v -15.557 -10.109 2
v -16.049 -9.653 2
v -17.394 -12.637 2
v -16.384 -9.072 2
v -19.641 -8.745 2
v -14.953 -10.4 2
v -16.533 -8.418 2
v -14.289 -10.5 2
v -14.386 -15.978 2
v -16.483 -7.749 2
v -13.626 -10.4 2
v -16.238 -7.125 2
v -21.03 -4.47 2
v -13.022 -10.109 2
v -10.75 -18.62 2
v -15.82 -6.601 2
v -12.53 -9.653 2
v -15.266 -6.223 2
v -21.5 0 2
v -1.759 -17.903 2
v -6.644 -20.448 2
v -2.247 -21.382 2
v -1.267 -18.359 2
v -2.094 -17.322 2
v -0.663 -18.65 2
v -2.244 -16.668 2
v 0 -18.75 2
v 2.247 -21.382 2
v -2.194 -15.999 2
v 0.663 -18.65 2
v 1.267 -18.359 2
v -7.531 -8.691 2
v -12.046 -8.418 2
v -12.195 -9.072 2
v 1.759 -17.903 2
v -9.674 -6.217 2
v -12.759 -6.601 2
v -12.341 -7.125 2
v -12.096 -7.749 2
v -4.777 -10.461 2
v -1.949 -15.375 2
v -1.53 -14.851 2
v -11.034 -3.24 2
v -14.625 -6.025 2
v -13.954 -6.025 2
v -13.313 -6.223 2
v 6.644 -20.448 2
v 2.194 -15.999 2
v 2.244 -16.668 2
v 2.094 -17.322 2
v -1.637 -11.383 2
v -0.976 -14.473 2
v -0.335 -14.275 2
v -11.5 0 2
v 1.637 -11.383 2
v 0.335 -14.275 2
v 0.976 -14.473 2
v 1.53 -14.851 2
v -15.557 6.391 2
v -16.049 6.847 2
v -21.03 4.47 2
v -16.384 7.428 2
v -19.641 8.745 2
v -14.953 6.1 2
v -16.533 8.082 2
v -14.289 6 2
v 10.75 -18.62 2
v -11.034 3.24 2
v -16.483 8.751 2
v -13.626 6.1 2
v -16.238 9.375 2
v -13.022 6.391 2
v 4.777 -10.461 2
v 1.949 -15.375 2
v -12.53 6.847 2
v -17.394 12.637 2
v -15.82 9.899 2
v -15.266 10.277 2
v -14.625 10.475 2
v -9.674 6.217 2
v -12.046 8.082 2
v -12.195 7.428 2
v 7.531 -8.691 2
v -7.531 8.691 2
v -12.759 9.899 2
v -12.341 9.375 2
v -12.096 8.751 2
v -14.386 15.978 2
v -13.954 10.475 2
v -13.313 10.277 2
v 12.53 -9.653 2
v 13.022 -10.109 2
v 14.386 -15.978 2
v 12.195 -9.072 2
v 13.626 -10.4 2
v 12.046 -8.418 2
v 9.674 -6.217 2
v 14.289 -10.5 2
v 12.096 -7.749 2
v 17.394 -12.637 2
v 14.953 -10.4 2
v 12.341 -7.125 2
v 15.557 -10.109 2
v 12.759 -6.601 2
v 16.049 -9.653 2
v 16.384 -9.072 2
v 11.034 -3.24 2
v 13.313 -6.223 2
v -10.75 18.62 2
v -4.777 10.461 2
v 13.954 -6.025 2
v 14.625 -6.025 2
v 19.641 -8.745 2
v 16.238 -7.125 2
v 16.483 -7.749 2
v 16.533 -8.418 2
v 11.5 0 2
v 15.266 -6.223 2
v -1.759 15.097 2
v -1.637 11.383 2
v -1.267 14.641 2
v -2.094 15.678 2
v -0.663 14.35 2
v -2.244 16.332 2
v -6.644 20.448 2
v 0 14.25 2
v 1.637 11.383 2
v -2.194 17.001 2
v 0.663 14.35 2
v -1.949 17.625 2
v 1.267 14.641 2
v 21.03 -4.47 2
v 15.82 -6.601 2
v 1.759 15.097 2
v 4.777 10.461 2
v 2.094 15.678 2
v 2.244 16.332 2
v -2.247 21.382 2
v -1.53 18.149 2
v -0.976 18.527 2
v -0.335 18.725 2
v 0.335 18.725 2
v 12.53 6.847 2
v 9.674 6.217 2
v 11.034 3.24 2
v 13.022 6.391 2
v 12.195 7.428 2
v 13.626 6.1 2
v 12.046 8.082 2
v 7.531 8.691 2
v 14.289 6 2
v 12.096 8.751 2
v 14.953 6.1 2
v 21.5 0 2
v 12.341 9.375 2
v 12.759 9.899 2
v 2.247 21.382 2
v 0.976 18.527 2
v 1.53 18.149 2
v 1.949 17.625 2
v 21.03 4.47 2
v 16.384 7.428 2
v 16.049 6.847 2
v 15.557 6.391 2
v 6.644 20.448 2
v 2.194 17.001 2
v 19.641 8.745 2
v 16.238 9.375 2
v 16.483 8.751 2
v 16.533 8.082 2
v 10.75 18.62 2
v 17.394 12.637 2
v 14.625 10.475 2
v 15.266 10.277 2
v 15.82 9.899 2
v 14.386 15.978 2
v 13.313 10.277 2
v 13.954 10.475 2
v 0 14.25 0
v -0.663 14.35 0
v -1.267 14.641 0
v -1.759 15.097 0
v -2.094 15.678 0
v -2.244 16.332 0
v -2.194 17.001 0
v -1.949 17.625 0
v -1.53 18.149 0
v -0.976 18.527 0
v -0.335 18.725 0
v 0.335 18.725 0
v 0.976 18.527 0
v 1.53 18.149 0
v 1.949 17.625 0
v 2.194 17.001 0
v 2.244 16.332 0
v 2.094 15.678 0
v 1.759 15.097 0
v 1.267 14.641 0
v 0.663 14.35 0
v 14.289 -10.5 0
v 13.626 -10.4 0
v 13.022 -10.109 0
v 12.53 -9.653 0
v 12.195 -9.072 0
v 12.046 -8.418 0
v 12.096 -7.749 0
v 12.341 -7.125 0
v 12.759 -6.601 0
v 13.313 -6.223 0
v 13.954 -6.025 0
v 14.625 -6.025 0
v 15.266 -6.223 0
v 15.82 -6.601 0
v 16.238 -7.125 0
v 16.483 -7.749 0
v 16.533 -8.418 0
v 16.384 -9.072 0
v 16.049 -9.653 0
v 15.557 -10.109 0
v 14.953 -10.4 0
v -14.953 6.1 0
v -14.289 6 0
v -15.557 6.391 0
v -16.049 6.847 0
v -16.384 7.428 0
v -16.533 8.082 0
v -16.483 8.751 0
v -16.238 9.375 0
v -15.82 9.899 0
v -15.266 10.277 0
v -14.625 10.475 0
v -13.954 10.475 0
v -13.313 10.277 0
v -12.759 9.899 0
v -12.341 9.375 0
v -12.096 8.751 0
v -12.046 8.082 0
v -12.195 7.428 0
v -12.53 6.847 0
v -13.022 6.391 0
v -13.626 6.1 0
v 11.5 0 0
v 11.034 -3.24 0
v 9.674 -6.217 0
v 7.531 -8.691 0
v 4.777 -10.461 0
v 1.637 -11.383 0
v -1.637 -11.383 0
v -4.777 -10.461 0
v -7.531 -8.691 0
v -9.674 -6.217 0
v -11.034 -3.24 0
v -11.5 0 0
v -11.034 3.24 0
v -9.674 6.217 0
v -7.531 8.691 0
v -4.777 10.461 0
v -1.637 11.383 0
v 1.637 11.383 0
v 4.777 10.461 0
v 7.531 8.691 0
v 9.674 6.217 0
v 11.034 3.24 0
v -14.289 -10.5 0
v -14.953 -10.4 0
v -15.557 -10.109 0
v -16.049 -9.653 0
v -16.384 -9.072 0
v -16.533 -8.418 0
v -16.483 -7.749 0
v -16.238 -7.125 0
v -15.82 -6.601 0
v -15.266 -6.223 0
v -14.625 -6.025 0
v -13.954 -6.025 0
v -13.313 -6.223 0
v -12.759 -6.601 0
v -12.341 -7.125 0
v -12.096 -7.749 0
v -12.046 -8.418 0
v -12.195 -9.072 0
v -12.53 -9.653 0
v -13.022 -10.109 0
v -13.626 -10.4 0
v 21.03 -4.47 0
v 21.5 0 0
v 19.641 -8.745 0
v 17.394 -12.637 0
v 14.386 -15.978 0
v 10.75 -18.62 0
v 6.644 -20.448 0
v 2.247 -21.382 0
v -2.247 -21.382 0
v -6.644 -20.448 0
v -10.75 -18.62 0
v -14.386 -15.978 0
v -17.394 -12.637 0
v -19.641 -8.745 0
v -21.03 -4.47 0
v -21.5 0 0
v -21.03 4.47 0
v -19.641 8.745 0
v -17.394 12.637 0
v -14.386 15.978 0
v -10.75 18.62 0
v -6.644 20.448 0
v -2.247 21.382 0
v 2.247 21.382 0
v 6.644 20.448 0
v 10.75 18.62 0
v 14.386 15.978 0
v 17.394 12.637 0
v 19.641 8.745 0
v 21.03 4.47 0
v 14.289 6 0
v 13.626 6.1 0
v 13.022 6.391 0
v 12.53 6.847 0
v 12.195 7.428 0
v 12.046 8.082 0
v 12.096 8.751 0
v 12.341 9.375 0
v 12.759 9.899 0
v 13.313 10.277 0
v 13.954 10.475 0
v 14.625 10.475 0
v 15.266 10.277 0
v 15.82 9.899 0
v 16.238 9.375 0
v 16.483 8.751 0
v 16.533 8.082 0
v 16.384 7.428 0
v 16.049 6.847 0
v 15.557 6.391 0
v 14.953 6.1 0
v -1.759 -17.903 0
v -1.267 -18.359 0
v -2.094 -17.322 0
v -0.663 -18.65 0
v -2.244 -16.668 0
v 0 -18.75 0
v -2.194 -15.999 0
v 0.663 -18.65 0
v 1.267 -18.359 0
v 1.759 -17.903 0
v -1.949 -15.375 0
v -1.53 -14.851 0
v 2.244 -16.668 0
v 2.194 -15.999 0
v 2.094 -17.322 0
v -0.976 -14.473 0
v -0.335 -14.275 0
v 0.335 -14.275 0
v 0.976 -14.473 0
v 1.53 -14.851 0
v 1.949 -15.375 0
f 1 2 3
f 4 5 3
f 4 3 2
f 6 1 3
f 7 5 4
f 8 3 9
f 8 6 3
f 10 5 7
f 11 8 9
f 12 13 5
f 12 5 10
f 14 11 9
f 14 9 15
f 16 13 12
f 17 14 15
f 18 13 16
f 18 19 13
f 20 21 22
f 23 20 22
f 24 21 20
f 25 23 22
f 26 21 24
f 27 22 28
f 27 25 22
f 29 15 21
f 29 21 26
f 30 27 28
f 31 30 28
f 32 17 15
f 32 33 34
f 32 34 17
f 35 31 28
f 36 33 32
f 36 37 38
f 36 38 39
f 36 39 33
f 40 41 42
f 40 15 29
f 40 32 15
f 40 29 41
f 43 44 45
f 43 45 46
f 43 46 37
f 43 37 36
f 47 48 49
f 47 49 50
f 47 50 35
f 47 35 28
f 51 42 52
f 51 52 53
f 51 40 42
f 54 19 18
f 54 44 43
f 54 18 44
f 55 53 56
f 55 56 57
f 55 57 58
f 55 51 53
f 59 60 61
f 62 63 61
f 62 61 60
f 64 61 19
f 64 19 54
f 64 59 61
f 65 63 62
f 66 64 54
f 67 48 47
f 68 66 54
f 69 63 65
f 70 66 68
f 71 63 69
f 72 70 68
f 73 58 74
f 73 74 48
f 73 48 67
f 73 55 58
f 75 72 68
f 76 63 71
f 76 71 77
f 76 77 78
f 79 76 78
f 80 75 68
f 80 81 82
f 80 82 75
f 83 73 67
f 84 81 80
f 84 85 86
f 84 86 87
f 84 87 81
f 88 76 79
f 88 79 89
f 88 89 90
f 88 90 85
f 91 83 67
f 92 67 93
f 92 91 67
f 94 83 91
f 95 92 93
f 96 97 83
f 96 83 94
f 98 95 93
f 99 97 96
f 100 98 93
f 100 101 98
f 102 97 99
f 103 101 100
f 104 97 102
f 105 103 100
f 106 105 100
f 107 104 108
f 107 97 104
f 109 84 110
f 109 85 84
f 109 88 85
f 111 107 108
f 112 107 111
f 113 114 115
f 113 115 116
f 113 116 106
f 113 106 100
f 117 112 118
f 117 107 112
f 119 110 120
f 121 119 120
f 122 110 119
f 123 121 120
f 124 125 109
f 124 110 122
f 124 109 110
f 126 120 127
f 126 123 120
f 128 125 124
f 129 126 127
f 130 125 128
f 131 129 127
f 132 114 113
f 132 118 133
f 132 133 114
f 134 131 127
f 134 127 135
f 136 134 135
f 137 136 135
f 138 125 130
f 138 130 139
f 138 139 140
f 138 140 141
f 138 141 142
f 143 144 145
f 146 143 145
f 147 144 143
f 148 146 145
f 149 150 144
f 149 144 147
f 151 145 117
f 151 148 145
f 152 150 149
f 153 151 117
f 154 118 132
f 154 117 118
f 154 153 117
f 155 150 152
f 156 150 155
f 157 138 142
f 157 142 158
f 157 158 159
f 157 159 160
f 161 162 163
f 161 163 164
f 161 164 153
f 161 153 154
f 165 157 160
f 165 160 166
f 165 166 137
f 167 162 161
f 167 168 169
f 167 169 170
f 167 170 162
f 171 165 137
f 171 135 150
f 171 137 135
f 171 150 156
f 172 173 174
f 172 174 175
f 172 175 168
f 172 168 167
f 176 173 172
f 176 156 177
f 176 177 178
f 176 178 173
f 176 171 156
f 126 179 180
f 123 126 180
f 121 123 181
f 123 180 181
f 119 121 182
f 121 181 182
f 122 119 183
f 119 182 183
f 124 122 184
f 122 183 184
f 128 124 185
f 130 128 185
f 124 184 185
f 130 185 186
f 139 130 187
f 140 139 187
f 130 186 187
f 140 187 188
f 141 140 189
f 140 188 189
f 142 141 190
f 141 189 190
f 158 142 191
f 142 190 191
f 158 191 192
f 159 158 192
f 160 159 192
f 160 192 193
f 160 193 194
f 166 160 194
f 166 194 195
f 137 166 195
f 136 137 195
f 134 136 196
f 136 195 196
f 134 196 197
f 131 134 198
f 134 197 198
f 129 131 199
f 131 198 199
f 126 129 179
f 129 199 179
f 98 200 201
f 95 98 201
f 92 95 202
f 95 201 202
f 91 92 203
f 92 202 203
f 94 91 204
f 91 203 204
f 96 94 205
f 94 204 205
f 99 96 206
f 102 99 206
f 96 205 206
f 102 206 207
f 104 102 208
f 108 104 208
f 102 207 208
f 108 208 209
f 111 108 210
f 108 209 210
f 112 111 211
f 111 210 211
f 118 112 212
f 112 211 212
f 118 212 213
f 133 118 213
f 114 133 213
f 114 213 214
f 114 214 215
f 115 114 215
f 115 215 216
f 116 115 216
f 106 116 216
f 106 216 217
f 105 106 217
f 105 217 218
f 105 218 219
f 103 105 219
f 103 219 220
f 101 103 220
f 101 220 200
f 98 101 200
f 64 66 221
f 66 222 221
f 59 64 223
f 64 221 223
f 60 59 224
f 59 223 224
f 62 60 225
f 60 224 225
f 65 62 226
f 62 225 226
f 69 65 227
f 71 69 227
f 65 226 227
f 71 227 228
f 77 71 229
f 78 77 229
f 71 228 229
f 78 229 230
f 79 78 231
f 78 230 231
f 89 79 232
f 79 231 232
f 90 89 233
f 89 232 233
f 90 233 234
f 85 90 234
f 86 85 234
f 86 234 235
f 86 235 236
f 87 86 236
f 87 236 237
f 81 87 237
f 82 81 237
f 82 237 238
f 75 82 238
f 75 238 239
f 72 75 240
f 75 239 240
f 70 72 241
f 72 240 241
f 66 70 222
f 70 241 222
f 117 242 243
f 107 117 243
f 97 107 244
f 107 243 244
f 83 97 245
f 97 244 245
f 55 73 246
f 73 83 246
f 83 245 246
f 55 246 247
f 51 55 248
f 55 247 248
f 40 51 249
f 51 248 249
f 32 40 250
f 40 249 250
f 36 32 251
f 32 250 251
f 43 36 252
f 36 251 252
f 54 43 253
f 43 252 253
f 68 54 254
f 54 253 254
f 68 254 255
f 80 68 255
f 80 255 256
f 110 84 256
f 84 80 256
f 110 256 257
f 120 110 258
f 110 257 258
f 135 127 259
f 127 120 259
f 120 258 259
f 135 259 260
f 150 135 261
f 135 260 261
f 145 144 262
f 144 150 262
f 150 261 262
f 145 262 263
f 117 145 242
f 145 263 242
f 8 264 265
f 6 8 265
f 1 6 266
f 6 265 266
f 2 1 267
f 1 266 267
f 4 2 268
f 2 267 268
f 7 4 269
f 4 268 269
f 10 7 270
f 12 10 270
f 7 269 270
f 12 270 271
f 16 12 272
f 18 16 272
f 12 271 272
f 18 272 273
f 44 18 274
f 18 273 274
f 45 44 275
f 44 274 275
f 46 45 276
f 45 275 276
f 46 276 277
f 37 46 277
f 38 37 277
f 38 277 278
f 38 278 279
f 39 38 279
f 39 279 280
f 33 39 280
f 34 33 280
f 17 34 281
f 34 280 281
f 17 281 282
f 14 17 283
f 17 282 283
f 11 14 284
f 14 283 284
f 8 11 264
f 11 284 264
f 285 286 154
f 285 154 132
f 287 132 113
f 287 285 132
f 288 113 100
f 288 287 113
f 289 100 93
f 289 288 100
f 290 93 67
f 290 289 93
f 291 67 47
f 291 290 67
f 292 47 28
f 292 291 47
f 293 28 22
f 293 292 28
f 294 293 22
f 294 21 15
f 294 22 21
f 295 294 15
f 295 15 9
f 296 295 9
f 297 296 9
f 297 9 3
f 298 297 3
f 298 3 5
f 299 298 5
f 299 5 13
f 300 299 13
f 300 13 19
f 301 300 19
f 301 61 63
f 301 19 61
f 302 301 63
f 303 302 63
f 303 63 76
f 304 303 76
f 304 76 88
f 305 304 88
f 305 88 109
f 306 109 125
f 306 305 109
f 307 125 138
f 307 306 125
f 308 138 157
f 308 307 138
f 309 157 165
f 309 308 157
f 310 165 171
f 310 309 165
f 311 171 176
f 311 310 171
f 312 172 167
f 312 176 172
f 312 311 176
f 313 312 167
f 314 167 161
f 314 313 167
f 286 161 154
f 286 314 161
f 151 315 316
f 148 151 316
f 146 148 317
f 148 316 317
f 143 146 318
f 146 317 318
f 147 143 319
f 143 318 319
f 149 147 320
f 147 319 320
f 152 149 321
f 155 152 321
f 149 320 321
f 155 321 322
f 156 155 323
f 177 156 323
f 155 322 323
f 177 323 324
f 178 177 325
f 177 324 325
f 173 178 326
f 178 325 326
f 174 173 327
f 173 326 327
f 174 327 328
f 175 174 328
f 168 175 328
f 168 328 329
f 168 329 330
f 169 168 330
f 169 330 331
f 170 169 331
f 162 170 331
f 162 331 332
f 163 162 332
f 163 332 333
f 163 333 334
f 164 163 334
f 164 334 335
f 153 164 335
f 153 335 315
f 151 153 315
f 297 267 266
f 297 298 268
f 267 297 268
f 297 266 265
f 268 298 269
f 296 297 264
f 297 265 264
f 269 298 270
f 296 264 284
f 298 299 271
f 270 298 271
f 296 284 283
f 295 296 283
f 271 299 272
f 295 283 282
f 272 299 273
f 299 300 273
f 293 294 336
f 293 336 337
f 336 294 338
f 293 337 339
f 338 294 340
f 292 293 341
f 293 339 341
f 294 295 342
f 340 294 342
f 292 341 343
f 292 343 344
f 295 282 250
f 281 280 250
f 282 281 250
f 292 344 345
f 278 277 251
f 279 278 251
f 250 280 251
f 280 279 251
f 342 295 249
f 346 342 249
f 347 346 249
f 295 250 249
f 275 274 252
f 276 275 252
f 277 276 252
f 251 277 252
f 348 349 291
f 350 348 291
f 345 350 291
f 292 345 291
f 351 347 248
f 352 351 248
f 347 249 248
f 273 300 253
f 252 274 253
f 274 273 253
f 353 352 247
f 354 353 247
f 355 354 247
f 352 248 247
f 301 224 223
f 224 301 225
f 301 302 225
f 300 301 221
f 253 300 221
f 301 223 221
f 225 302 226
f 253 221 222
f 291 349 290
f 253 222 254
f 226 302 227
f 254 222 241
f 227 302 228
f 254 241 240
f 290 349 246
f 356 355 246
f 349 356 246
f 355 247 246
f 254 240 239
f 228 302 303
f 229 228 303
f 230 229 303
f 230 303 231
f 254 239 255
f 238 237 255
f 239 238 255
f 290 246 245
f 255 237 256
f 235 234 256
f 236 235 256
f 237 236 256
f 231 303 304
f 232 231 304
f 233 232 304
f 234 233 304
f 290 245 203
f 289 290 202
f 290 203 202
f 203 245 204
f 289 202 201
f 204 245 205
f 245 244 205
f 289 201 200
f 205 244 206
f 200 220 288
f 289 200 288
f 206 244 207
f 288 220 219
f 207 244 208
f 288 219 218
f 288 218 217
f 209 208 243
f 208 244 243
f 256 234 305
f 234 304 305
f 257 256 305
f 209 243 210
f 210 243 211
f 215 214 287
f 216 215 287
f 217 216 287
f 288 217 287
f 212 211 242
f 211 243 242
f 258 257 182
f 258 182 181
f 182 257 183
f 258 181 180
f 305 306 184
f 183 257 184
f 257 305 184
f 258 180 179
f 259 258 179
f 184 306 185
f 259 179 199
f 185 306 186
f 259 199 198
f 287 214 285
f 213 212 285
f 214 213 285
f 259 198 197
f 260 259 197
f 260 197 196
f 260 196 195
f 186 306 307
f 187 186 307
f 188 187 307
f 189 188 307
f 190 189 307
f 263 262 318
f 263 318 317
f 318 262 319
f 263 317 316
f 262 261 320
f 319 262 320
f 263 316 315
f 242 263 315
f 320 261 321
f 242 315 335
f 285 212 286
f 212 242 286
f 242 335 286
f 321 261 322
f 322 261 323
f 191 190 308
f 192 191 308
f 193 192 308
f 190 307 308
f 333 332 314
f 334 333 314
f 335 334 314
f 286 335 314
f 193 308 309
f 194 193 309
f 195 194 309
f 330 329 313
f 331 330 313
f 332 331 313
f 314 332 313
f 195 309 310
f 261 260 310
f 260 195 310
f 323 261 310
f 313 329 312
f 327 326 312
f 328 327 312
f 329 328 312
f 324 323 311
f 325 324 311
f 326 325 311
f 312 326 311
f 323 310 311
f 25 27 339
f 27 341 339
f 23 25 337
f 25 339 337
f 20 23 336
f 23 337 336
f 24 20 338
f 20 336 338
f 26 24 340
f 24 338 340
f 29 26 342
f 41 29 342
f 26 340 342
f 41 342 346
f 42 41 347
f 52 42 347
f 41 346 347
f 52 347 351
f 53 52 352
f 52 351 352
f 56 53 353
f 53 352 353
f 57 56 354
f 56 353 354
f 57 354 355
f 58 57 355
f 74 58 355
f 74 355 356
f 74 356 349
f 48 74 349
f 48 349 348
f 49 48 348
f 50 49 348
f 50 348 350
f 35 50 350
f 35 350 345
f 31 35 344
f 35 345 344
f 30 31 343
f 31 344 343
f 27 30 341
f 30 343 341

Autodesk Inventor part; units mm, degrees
ref_plane "YZ Plane" through (0, 0, 0) normal (1, 0, 0) x (0, 1, 0)
ref_plane "XZ Plane" through (0, 0, 0) normal (0, 1, 0) x (-1, 0, 0)
ref_plane "XY Plane" through (0, 0, 0) normal (0, 0, 1) x (1, 0, 0)
sketch "Sketch2" plane through (0, 0, 0) normal (0, 0, 1) x (1, 0, 0)
  circle A0 centre (0, 0) radius 11.5
  circle A1 centre (0, 0) radius 21.5
  dimension "d0" = 23
  dimension "d1" = 10
extrude "Extrusion1" add sketch "Sketch2" along normal blind 2
sketch "Sketch3" plane through (0, 0, 2) normal (0, 0, 1) x (1, 0, 0)
  circle A0 centre (0, 0) radius 21.5 construction
  circle A1 centre (0, 0) radius 11.5 construction
  circle A2 centre (0, 0) radius 16.5 construction
  point P0 (0, 16.5)
  point P1 (-14.2894, 8.25)
  point P2 (-14.2894, -8.25)
  point P3 (0, -16.5)
  point P4 (14.2894, -8.25)
  point P5 (14.2894, 8.25)
  dimension "d13" = 33
  dimension "d16" = 360
hole "Hole1" at (-14.2894, 8.25, 2) at (0, 16.5, 2) at (14.2894, 8.25, 2) at (14.2894, -8.25, 2) at (0, -16.5, 2) at (-14.2894, -8.25, 2) direction (0, 0, -1) diameter 4.5 end through all clearance for "Flat Head Machine Screw" size "M4" standard "Ansi Metric M Profile"
properties part number "P025" material "Polytetrafluoroethylene"
